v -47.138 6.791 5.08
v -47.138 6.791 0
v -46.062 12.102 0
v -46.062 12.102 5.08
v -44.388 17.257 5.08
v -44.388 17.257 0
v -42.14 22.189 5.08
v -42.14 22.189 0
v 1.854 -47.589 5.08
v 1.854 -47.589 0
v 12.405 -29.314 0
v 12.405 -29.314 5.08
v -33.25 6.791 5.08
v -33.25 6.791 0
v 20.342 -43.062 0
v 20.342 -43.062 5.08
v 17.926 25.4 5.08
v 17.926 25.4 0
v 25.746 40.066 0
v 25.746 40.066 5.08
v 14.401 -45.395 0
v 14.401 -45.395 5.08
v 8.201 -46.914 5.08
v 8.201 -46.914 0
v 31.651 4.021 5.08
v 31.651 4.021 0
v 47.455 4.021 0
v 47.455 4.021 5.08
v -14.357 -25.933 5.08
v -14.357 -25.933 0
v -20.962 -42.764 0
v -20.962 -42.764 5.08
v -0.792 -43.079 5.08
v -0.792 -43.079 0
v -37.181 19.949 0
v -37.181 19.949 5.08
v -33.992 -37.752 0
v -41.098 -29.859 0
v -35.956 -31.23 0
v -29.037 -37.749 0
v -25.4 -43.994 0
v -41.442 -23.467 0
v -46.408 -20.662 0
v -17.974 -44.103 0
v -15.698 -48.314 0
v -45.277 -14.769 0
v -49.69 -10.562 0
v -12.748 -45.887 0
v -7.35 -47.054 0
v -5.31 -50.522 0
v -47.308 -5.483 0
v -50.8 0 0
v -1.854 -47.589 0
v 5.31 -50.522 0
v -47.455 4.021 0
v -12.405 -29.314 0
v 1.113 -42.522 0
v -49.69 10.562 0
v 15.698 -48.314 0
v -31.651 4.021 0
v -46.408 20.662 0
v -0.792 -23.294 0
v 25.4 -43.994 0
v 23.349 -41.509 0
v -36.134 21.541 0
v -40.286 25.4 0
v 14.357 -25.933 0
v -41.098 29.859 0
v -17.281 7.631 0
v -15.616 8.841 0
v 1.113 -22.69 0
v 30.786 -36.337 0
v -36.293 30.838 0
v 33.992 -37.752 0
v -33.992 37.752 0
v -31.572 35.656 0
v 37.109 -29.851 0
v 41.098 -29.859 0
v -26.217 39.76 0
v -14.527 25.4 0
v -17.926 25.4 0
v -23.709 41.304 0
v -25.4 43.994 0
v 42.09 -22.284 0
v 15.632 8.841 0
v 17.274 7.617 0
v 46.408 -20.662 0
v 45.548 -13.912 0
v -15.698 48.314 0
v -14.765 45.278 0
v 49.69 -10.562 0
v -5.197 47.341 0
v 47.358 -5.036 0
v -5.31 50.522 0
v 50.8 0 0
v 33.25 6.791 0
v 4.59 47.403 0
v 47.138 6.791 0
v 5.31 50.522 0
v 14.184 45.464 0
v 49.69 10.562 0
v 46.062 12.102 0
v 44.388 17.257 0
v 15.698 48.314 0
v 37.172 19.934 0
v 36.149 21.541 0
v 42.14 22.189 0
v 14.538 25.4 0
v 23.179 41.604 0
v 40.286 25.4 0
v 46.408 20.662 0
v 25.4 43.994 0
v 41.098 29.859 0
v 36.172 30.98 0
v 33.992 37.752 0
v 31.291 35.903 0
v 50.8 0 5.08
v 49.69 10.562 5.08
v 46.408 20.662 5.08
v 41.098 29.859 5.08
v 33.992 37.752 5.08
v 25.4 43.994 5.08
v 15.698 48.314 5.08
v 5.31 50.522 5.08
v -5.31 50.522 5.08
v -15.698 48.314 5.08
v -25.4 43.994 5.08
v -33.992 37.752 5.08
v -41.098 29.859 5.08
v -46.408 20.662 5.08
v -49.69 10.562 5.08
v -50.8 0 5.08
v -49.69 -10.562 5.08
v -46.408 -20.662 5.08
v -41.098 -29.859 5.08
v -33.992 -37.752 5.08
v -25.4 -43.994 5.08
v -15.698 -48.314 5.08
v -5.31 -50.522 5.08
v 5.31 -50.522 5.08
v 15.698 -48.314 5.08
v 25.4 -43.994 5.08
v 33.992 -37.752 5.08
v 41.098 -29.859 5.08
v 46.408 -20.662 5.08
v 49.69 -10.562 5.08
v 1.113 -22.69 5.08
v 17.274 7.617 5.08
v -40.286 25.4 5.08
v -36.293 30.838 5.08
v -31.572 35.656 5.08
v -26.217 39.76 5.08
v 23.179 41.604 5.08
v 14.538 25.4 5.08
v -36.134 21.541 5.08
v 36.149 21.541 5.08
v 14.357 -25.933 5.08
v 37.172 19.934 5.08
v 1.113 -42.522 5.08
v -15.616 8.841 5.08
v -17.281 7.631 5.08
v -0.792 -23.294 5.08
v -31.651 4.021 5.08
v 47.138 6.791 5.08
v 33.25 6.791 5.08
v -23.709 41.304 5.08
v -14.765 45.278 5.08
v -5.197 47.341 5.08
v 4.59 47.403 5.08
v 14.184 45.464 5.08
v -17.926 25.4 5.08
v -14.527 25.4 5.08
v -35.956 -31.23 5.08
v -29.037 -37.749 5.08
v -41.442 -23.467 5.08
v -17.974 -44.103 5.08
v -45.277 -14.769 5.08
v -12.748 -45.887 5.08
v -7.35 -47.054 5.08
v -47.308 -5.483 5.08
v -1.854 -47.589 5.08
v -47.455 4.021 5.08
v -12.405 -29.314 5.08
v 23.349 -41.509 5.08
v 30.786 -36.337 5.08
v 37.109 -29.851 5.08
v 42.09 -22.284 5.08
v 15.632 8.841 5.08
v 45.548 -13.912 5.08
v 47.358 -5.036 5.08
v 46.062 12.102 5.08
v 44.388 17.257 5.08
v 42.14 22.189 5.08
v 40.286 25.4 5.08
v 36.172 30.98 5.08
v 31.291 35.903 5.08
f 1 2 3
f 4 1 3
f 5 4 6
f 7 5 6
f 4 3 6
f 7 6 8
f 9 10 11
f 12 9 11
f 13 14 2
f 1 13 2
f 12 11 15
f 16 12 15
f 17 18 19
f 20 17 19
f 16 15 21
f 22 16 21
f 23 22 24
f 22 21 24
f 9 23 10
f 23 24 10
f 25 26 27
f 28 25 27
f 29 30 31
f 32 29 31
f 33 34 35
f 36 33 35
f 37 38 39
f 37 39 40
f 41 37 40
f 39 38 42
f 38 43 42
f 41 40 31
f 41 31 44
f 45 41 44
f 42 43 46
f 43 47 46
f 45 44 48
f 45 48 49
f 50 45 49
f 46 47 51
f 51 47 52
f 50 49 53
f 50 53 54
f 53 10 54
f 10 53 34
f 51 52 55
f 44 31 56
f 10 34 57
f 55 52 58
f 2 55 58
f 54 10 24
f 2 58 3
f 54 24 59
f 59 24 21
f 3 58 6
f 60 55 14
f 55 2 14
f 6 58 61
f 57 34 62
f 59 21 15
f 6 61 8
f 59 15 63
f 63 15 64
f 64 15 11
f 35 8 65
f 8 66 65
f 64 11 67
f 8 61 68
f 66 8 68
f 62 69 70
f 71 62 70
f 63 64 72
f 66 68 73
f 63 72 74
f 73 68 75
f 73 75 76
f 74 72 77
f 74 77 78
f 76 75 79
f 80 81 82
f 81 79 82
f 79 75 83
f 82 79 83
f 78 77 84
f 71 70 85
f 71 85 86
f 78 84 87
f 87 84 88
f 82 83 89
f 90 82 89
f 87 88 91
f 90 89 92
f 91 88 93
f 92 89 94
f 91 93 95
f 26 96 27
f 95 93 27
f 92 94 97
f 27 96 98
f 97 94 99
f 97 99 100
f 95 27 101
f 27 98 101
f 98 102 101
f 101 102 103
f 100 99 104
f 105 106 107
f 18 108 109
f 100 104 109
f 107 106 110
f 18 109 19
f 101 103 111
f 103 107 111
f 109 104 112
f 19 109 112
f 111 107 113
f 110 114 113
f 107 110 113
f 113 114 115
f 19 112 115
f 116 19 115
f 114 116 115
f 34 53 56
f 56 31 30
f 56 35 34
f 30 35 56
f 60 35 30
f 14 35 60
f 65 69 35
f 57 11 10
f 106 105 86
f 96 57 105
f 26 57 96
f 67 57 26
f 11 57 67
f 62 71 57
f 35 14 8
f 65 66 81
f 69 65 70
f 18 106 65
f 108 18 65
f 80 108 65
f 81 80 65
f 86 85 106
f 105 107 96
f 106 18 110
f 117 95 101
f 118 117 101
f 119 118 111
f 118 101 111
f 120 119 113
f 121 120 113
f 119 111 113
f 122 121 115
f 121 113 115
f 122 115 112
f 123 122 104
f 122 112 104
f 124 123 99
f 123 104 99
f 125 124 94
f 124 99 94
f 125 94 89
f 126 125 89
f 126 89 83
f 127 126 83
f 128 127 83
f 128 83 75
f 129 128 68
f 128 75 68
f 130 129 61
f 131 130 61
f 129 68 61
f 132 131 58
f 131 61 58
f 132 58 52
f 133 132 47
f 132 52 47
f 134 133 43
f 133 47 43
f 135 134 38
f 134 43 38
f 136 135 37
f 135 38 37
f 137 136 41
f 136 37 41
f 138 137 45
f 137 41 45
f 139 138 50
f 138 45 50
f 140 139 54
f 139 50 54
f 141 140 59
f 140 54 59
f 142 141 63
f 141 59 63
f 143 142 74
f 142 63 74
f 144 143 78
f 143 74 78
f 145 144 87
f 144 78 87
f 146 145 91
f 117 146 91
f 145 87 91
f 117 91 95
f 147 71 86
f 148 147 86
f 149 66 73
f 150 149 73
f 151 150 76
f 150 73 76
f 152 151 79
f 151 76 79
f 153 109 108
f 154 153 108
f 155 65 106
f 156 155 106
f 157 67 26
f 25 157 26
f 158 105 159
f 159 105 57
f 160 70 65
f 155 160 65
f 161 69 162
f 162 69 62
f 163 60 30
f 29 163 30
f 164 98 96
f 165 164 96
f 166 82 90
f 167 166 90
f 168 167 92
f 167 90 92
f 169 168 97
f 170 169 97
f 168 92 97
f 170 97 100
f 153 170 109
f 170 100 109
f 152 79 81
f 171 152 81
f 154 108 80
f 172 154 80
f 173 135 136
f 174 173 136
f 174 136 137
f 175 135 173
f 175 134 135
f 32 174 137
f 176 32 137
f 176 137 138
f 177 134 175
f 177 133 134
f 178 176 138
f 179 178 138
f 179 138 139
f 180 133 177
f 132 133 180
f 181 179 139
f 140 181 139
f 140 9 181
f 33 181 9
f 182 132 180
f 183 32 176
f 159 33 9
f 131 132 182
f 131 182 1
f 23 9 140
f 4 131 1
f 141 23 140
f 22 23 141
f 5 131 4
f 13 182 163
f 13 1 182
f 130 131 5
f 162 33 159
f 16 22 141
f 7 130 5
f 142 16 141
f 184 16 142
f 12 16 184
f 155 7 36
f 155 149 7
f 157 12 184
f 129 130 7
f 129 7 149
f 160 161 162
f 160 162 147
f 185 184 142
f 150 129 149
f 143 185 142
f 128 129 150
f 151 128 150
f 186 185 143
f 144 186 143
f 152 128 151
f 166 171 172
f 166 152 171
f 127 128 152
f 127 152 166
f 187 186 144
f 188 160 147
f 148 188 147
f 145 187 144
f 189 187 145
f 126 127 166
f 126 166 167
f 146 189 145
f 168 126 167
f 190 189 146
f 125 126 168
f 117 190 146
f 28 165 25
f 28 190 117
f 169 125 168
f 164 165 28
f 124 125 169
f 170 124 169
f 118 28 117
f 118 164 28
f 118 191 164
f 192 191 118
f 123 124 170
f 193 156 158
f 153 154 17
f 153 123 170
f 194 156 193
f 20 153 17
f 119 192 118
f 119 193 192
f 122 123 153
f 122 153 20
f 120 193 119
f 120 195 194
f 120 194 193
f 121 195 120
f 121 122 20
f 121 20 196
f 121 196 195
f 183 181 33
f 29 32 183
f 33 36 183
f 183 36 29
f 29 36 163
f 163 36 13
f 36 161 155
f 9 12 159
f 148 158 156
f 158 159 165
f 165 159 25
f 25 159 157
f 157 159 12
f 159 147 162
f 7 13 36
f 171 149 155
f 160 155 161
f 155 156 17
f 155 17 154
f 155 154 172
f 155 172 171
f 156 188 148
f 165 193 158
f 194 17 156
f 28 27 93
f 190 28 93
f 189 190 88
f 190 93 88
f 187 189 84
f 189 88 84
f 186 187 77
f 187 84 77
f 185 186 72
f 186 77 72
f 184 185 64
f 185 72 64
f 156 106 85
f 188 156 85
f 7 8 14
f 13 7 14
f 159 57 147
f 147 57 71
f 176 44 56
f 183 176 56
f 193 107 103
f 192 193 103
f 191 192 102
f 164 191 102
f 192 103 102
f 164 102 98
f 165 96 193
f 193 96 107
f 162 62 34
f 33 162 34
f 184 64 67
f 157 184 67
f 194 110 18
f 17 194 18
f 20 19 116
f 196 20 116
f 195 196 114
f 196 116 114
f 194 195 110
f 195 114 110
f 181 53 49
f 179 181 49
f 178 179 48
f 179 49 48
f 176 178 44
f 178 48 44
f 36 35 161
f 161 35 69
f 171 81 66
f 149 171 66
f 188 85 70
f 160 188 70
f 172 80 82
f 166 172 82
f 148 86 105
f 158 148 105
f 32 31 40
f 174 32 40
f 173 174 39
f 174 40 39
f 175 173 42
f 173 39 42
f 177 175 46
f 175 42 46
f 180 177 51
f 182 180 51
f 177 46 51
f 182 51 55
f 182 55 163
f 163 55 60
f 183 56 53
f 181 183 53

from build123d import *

# Parameters (mm, degrees)
F0_R     = 50.8
F1_DEPTH = 5.08


# Not quite as in the source:
# - a feature names something its author has since deleted; it is built from what else it names


with BuildPart() as f1:
    # F0 (on Top) → F1 (new body)
    with BuildSketch(Plane.XY):
        Circle(F0_R)
        with BuildLine():
            Line((-17.9742814731, -44.1029004775), (-12.4049825801, -29.3139399042))
            Line((-12.4049825801, -29.3139399042), (-1.8539284107, -47.5889017991))
            ThreePointArc((-1.8539284107, -47.5889017991), (-10.066157564, -46.549039699), (-17.9742814731, -44.1029004775))
        make_face(mode=Mode.SUBTRACT)
        with BuildLine():
            ThreePointArc((-20.9620816677, -42.7636733356), (-41.4419156704, -23.4671738939), (-47.4549141022, 4.0214117617))
            Line((-47.4549141022, 4.0214117617), (-31.651156838, 4.0214117617))
            Line((-31.651156838, 4.0214117617), (-14.3567544825, -25.9333718046))
            Line((-14.3567544825, -25.9333718046), (-20.9620816677, -42.7636733356))
        make_face(mode=Mode.SUBTRACT)
        Polygon((-0.7916404097, -43.0788385891), (-37.1806461747, 19.9487682329), (-17.281252241, 7.6313526128), (-0.7916404097, -23.293502324), align=None, mode=Mode.SUBTRACT)
        with BuildLine():
            ThreePointArc((20.3423780674, -43.061912168), (11.3266241262, -46.2584933921), (1.8539284107, -47.5889017991))
            Line((1.8539284107, -47.5889017991), (12.4049825801, -29.3139399042))
            Line((12.4049825801, -29.3139399042), (20.3423780674, -43.061912168))
        make_face(mode=Mode.SUBTRACT)
        Polygon((17.2735304892, 7.6168711285), (37.1719298571, 19.9336711278), (1.1133595903, -42.5216046224), (1.1133595903, -22.6901455503), align=None, mode=Mode.SUBTRACT)
        with BuildLine():
            Line((14.3567544825, -25.9333718046), (31.651156838, 4.0214117617))
            Line((31.651156838, 4.0214117617), (47.4549141022, 4.0214117617))
            ThreePointArc((47.4549141022, 4.0214117617), (42.0897424453, -22.2843937743), (23.3490930586, -41.5085590974))
            Line((23.3490930586, -41.5085590974), (14.3567544825, -25.9333718046))
        make_face(mode=Mode.SUBTRACT)
        with BuildLine():
            ThreePointArc((-47.1383927866, 6.7906222465), (-45.2983646948, 14.7036995676), (-42.1401621016, 22.1889017991))
            Line((-42.1401621016, 22.1889017991), (-33.2499612568, 6.7906222465))
            Line((-33.2499612568, 6.7906222465), (-47.1383927866, 6.7906222465))
        make_face(mode=Mode.SUBTRACT)
        with BuildLine():
            Line((-17.9263273651, 25.4), (-40.2862336909, 25.4))
            ThreePointArc((-40.2862336909, 25.4), (-34.0178257765, 33.3305888703), (-26.2168031881, 39.7595253442))
            Line((-26.2168031881, 39.7595253442), (-17.9263273651, 25.4))
        make_face(mode=Mode.SUBTRACT)
        with BuildLine():
            ThreePointArc((-23.7093258464, 41.3038556664), (-0.3049103548, 47.6240239236), (23.1785122433, 41.6040526293))
            Line((23.1785122433, 41.6040526293), (14.5382603004, 25.4))
            Line((14.5382603004, 25.4), (-14.5272304963, 25.4))
            Line((-14.5272304963, 25.4), (-23.7093258464, 41.3038556664))
        make_face(mode=Mode.SUBTRACT)
        Polygon((-15.6162167432, 8.8411357684), (-36.1336946584, 21.5411357684), (36.1493684604, 21.5411357684), (15.6318905452, 8.8411357684), align=None, mode=Mode.SUBTRACT)
        with BuildLine():
            Line((47.1383927866, 6.7906222465), (33.2499612568, 6.7906222465))
            Line((33.2499612568, 6.7906222465), (42.1401621016, 22.1889017991))
            ThreePointArc((42.1401621016, 22.1889017991), (45.2983646948, 14.7036995676), (47.1383927866, 6.7906222465))
        make_face(mode=Mode.SUBTRACT)
        with BuildLine():
            Line((40.2862336909, 25.4), (17.9263273651, 25.4))
            Line((17.9263273651, 25.4), (25.7463457142, 40.065774763))
            ThreePointArc((25.7463457142, 40.065774763), (33.8208016326, 33.5304936129), (40.2862336909, 25.4))
        make_face(mode=Mode.SUBTRACT)
    extrude(amount=F1_DEPTH)


solid = f1.part
